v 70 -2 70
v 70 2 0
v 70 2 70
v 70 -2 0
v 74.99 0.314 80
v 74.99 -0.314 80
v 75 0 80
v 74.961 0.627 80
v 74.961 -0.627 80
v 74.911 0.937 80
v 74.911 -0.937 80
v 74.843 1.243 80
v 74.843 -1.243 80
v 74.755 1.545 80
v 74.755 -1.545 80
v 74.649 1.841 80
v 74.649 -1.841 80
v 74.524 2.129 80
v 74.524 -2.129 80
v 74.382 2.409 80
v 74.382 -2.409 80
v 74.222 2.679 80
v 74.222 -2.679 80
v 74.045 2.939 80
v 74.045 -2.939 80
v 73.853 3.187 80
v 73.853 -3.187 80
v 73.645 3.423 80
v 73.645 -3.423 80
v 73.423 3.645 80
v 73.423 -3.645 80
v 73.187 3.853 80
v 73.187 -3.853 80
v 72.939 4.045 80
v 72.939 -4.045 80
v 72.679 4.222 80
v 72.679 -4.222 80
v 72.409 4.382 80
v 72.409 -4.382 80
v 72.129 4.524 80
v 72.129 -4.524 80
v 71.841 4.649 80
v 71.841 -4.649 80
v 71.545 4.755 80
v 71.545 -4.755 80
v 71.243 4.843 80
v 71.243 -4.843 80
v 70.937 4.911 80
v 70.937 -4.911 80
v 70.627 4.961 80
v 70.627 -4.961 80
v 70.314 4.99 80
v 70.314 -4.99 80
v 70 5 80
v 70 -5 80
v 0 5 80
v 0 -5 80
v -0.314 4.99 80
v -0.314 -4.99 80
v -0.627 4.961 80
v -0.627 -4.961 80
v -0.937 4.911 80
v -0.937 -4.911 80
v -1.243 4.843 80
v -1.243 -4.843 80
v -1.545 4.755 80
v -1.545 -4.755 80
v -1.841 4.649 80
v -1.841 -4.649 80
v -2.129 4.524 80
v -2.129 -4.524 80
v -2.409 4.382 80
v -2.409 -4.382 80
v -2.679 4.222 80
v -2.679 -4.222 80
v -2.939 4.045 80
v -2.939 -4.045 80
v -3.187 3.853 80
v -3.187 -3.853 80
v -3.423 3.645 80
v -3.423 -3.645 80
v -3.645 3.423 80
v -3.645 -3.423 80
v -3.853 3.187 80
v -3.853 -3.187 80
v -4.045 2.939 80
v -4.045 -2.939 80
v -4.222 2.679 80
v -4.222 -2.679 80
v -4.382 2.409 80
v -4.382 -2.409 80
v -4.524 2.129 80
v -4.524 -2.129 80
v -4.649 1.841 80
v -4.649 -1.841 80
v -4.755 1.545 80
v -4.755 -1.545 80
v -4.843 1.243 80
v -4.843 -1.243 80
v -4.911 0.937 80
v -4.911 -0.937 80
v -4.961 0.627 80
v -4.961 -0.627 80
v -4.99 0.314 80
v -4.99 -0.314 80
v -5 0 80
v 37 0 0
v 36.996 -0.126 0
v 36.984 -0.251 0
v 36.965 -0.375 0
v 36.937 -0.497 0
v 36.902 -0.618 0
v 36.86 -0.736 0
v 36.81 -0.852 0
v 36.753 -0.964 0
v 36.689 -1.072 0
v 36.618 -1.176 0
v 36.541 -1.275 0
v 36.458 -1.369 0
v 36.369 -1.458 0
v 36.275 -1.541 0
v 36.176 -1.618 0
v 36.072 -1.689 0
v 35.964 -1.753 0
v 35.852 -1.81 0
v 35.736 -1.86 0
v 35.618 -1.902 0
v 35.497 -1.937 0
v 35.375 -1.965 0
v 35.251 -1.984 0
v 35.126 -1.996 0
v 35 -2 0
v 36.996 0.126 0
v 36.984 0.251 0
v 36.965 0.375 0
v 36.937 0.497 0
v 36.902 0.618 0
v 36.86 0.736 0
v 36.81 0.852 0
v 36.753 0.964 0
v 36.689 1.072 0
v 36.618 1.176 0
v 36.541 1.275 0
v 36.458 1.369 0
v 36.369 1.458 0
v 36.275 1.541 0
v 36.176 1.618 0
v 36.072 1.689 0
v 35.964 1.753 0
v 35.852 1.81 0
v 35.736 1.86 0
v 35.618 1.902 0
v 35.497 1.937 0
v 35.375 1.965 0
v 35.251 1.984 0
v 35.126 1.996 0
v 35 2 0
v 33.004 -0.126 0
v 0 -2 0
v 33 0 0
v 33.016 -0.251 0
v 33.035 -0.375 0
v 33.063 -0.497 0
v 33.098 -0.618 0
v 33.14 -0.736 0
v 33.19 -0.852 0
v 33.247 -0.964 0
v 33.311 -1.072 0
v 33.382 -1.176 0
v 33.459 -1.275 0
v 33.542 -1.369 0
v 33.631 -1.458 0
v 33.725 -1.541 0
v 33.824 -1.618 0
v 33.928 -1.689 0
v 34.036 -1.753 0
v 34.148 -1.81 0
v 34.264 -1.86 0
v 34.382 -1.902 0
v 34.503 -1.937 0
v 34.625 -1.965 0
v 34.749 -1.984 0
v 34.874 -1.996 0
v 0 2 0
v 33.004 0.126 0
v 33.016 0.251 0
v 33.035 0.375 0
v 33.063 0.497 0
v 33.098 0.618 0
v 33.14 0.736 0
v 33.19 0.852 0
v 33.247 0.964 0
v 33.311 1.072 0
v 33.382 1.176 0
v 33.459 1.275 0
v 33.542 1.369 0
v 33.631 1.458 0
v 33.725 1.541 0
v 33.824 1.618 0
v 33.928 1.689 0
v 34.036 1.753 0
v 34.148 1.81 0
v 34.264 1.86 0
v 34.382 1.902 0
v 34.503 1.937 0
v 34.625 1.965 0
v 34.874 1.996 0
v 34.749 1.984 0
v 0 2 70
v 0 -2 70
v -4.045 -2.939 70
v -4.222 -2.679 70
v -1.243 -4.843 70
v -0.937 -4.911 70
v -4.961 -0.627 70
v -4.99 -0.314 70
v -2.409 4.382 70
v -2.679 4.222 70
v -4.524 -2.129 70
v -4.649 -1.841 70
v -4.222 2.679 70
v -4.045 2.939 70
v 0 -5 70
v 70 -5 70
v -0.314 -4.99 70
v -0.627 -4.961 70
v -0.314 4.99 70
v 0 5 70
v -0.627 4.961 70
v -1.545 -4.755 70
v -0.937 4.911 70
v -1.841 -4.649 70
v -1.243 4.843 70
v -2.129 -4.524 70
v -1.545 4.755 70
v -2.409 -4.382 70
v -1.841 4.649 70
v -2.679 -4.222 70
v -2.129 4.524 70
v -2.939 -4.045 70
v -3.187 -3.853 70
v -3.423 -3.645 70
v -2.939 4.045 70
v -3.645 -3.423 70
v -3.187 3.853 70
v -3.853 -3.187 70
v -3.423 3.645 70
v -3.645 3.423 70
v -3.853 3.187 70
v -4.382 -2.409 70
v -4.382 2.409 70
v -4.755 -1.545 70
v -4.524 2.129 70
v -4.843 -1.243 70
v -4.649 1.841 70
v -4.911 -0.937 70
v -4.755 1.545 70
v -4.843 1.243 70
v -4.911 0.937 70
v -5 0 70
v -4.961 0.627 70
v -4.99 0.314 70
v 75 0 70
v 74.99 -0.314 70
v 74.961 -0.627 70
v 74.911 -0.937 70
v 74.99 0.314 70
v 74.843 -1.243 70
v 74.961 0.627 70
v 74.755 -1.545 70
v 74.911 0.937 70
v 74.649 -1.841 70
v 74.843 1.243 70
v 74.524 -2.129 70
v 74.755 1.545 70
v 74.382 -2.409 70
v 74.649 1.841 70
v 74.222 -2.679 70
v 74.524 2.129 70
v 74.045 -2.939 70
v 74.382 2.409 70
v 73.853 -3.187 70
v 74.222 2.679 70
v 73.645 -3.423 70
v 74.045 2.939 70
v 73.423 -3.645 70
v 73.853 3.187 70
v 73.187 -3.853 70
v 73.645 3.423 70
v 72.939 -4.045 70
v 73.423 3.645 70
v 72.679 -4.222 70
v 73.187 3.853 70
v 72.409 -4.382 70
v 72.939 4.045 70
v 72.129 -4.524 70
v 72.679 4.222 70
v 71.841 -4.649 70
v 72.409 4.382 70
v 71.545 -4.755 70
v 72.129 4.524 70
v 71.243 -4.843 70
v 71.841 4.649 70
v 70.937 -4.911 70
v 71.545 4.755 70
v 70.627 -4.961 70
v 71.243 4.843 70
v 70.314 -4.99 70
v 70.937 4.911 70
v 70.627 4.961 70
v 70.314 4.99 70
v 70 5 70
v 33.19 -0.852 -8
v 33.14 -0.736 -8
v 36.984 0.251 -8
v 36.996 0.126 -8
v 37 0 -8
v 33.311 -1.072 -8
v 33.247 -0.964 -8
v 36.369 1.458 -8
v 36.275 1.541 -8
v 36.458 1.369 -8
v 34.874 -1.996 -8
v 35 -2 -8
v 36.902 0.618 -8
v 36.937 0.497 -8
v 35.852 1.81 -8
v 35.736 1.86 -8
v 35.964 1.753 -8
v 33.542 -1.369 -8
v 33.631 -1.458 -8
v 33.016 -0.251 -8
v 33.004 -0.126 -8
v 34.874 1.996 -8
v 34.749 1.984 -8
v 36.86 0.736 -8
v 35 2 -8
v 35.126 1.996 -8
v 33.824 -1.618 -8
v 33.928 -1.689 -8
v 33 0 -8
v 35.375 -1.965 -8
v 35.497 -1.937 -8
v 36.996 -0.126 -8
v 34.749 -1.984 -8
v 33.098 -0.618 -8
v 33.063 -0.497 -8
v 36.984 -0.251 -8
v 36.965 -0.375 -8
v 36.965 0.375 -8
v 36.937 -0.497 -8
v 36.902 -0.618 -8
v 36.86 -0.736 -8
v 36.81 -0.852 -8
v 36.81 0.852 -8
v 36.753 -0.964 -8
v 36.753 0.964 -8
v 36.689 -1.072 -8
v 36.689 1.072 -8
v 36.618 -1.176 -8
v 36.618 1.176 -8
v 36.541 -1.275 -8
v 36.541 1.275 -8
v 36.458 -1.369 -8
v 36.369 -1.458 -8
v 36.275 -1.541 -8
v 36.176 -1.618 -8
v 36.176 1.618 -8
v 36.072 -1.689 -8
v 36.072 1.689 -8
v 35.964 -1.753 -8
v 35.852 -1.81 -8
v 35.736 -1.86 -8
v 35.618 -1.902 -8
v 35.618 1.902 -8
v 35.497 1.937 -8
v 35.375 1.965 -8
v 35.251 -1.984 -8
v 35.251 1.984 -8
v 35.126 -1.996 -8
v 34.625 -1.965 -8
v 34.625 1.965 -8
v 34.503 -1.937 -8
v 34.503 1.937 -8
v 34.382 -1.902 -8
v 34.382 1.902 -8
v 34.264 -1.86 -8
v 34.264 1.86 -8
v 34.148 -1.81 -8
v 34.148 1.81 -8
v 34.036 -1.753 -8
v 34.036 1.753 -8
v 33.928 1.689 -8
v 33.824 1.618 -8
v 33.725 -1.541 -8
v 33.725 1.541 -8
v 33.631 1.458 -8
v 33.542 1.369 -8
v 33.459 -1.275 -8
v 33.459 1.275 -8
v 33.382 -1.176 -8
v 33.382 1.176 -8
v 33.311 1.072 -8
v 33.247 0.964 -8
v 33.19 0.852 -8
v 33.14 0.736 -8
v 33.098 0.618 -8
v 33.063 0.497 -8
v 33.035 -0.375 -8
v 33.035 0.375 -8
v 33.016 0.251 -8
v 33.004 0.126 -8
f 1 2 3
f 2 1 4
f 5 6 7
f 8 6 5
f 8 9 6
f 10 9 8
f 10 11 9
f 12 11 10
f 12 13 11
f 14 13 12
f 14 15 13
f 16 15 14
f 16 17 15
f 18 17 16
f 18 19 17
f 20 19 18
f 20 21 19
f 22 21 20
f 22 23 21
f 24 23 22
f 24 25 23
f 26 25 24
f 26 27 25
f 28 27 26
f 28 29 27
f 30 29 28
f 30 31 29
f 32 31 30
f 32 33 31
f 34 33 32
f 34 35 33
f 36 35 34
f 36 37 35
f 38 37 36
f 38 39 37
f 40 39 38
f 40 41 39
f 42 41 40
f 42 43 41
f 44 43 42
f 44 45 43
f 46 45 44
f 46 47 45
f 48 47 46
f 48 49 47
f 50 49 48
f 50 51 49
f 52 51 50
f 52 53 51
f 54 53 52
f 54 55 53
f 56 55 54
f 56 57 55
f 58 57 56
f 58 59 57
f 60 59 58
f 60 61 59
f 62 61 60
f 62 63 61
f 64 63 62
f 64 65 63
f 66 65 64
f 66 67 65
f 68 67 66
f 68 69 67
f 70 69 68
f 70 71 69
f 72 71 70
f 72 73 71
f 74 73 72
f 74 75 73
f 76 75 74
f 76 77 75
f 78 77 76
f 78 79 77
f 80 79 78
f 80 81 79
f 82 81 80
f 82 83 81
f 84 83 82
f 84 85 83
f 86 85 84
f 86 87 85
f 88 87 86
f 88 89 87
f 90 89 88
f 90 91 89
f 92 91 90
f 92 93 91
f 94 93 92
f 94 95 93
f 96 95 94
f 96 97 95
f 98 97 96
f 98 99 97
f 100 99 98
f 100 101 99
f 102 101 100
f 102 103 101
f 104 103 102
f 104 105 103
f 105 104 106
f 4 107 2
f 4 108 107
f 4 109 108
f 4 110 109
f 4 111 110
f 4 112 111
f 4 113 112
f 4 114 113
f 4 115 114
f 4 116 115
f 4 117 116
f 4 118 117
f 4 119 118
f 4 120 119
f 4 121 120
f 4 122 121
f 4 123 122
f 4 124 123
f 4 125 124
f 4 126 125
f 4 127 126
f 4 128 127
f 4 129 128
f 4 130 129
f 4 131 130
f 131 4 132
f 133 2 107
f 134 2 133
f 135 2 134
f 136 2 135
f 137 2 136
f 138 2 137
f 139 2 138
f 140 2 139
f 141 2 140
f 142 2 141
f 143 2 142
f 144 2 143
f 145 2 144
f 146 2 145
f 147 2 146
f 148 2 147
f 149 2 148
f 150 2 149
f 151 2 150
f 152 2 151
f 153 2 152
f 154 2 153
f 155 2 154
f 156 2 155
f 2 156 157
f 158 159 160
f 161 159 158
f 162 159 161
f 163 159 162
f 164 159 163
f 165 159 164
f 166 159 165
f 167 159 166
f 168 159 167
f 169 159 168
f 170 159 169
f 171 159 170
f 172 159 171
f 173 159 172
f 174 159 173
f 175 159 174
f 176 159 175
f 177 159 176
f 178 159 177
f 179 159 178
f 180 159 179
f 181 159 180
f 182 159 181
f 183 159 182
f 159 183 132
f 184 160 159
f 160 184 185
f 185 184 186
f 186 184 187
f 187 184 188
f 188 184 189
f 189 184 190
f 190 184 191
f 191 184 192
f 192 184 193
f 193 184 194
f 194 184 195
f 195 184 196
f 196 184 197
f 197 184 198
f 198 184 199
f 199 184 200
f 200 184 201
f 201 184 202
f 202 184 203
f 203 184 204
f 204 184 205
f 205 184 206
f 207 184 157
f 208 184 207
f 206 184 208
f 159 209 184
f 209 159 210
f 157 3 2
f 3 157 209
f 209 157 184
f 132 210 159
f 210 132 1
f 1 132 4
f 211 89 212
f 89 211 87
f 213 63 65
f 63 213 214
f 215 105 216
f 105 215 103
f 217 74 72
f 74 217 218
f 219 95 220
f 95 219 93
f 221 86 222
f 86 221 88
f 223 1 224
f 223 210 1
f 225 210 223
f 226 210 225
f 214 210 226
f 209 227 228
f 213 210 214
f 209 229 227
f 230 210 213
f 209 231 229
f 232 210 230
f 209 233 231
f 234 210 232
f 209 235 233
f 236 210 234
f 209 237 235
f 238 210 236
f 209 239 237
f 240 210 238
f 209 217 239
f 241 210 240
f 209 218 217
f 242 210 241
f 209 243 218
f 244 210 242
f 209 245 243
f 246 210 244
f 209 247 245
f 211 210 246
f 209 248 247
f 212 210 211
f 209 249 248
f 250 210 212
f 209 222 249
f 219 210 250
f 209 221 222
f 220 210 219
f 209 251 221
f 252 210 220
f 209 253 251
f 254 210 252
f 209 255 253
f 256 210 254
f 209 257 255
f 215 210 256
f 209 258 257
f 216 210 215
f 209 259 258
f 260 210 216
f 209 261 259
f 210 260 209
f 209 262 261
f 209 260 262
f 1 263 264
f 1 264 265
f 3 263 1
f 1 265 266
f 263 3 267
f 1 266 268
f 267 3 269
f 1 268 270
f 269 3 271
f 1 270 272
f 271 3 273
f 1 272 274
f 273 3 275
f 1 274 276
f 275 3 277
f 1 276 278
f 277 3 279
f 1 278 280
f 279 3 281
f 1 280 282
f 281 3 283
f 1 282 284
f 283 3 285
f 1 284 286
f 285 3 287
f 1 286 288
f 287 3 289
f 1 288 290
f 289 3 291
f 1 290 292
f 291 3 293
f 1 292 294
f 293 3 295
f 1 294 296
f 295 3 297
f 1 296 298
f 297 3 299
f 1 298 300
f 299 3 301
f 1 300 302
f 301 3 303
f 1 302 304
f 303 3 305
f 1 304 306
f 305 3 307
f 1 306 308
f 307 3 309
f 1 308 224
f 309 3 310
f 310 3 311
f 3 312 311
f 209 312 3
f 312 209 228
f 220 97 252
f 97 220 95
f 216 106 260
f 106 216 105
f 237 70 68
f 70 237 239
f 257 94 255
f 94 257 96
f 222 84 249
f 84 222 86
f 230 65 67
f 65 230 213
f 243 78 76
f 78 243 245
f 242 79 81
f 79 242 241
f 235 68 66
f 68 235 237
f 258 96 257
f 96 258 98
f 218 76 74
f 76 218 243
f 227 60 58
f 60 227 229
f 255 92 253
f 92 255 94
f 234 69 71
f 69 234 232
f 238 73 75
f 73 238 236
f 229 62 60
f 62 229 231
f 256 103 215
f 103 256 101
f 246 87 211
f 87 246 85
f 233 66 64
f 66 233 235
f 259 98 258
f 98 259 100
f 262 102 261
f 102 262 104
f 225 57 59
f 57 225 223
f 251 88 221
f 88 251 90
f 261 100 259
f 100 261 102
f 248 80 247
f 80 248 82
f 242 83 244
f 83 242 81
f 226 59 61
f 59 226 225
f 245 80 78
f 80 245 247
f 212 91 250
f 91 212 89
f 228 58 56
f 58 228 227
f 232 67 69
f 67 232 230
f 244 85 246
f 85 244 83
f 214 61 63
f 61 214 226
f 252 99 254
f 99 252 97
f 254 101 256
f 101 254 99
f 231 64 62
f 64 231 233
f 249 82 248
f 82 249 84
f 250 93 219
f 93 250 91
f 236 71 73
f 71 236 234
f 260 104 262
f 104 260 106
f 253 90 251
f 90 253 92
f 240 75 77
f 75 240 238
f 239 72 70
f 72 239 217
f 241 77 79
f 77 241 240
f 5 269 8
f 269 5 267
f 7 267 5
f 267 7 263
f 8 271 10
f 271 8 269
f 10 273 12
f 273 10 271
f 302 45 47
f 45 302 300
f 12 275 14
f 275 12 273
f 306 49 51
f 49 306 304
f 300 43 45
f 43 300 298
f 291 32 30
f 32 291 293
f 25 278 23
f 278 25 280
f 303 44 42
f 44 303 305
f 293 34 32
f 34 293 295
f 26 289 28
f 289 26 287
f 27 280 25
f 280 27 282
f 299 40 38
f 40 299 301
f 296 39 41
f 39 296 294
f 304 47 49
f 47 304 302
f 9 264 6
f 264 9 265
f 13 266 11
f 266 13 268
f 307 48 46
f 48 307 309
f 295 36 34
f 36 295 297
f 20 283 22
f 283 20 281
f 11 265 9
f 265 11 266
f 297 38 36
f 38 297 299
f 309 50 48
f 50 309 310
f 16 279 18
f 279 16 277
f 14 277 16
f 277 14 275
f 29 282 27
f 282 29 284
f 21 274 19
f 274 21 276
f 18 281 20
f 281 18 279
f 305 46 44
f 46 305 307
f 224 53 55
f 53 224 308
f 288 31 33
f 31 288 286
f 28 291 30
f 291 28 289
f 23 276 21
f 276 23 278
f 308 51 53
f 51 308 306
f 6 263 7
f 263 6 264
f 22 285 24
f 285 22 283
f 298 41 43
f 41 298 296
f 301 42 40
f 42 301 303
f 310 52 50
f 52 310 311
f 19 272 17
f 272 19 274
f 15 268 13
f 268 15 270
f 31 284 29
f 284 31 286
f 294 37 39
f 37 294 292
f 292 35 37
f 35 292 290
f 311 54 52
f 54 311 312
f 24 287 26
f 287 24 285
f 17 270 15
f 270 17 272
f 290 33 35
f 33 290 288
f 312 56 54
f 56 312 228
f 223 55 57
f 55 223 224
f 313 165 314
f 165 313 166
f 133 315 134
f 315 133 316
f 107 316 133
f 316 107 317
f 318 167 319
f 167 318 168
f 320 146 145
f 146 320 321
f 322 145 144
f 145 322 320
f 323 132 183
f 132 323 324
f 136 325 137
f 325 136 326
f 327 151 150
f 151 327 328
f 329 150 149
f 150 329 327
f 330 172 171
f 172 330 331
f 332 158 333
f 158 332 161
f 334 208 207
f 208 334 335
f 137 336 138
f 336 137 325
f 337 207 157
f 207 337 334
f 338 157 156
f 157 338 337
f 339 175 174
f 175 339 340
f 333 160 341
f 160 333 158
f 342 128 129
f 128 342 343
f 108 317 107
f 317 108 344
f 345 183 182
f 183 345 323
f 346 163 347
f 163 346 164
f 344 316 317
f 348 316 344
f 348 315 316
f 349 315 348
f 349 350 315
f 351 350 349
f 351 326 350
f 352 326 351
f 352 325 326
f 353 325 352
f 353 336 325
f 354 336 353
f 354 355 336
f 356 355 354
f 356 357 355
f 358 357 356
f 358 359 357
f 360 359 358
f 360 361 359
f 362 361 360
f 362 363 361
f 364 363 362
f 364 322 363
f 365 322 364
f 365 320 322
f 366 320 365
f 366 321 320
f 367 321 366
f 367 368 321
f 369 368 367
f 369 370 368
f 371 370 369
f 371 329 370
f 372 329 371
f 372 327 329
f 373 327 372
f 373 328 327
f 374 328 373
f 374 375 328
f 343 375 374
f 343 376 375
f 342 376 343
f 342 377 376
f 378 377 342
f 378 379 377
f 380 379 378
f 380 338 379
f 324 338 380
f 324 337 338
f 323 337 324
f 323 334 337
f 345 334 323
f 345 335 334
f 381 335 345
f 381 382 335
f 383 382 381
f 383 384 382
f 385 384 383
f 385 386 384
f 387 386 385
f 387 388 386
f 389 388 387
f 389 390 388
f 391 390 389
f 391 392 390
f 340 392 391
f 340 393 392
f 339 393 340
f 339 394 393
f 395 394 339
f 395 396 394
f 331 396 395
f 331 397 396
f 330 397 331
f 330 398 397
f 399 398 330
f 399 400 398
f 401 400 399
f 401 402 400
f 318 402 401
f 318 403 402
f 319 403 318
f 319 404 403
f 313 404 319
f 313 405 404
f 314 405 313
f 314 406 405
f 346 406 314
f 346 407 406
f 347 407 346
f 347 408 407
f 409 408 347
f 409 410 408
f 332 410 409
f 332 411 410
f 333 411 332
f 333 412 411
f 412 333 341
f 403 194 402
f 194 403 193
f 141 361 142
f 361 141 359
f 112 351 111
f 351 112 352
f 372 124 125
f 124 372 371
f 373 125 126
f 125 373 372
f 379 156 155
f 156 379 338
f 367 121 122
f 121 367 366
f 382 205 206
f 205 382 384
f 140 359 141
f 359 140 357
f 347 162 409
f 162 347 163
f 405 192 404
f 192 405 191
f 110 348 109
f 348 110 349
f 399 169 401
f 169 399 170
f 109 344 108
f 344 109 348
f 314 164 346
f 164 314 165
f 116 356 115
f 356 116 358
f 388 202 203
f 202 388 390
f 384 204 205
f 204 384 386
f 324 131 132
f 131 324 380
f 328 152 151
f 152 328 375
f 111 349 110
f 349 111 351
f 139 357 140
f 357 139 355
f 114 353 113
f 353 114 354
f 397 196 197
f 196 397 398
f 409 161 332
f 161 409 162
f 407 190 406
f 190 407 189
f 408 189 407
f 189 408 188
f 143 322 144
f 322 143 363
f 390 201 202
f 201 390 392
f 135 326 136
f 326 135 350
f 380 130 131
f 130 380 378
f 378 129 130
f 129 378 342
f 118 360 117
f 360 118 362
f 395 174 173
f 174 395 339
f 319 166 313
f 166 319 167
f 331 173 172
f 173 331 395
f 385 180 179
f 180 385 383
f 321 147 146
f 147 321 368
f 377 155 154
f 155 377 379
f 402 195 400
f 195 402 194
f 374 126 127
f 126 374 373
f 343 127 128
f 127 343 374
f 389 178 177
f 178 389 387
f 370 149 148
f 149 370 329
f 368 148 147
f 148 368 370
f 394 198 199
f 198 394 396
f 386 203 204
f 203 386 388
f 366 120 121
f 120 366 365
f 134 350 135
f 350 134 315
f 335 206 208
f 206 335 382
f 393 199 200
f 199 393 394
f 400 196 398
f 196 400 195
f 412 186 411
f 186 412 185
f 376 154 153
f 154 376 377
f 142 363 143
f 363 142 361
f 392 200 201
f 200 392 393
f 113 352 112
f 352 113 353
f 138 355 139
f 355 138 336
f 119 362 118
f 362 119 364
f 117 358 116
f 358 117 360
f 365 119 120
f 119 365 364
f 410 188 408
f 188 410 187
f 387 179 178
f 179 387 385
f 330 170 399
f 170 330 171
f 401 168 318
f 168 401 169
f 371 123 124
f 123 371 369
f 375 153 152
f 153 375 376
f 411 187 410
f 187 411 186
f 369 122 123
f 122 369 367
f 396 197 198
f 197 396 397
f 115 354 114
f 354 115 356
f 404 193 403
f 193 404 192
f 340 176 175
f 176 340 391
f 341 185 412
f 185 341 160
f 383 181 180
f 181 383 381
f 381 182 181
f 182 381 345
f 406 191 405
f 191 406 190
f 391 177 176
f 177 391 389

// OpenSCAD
$fn = 100;

_height = 80;
_width = 70;
_thickness = 4;
_holder_top_dia = 10;
_holder_top_height = 10;
_center_stick_dia = 4;
_center_stick_height = 8;

translate([_width / 2, 0, _height / 2]) 
cube([_width, _thickness, _height], center = true);

// top holder left side
translate([0, 0, _height - _holder_top_height]) 
cylinder(h=_holder_top_height, d=_holder_top_dia);

// topholder right side
translate([_width , 0, _height - _holder_top_height]) 
cylinder(h=_holder_top_height, d=_holder_top_dia);

// top holder connector
translate([_width / 2, 0, _height - _holder_top_height / 2]) 
cube([_width, _holder_top_dia, _holder_top_height], center = true);

// Center stick
translate([_width / 2, 0, - _center_stick_height]) 
cylinder(h = _center_stick_height, d = _center_stick_dia);
